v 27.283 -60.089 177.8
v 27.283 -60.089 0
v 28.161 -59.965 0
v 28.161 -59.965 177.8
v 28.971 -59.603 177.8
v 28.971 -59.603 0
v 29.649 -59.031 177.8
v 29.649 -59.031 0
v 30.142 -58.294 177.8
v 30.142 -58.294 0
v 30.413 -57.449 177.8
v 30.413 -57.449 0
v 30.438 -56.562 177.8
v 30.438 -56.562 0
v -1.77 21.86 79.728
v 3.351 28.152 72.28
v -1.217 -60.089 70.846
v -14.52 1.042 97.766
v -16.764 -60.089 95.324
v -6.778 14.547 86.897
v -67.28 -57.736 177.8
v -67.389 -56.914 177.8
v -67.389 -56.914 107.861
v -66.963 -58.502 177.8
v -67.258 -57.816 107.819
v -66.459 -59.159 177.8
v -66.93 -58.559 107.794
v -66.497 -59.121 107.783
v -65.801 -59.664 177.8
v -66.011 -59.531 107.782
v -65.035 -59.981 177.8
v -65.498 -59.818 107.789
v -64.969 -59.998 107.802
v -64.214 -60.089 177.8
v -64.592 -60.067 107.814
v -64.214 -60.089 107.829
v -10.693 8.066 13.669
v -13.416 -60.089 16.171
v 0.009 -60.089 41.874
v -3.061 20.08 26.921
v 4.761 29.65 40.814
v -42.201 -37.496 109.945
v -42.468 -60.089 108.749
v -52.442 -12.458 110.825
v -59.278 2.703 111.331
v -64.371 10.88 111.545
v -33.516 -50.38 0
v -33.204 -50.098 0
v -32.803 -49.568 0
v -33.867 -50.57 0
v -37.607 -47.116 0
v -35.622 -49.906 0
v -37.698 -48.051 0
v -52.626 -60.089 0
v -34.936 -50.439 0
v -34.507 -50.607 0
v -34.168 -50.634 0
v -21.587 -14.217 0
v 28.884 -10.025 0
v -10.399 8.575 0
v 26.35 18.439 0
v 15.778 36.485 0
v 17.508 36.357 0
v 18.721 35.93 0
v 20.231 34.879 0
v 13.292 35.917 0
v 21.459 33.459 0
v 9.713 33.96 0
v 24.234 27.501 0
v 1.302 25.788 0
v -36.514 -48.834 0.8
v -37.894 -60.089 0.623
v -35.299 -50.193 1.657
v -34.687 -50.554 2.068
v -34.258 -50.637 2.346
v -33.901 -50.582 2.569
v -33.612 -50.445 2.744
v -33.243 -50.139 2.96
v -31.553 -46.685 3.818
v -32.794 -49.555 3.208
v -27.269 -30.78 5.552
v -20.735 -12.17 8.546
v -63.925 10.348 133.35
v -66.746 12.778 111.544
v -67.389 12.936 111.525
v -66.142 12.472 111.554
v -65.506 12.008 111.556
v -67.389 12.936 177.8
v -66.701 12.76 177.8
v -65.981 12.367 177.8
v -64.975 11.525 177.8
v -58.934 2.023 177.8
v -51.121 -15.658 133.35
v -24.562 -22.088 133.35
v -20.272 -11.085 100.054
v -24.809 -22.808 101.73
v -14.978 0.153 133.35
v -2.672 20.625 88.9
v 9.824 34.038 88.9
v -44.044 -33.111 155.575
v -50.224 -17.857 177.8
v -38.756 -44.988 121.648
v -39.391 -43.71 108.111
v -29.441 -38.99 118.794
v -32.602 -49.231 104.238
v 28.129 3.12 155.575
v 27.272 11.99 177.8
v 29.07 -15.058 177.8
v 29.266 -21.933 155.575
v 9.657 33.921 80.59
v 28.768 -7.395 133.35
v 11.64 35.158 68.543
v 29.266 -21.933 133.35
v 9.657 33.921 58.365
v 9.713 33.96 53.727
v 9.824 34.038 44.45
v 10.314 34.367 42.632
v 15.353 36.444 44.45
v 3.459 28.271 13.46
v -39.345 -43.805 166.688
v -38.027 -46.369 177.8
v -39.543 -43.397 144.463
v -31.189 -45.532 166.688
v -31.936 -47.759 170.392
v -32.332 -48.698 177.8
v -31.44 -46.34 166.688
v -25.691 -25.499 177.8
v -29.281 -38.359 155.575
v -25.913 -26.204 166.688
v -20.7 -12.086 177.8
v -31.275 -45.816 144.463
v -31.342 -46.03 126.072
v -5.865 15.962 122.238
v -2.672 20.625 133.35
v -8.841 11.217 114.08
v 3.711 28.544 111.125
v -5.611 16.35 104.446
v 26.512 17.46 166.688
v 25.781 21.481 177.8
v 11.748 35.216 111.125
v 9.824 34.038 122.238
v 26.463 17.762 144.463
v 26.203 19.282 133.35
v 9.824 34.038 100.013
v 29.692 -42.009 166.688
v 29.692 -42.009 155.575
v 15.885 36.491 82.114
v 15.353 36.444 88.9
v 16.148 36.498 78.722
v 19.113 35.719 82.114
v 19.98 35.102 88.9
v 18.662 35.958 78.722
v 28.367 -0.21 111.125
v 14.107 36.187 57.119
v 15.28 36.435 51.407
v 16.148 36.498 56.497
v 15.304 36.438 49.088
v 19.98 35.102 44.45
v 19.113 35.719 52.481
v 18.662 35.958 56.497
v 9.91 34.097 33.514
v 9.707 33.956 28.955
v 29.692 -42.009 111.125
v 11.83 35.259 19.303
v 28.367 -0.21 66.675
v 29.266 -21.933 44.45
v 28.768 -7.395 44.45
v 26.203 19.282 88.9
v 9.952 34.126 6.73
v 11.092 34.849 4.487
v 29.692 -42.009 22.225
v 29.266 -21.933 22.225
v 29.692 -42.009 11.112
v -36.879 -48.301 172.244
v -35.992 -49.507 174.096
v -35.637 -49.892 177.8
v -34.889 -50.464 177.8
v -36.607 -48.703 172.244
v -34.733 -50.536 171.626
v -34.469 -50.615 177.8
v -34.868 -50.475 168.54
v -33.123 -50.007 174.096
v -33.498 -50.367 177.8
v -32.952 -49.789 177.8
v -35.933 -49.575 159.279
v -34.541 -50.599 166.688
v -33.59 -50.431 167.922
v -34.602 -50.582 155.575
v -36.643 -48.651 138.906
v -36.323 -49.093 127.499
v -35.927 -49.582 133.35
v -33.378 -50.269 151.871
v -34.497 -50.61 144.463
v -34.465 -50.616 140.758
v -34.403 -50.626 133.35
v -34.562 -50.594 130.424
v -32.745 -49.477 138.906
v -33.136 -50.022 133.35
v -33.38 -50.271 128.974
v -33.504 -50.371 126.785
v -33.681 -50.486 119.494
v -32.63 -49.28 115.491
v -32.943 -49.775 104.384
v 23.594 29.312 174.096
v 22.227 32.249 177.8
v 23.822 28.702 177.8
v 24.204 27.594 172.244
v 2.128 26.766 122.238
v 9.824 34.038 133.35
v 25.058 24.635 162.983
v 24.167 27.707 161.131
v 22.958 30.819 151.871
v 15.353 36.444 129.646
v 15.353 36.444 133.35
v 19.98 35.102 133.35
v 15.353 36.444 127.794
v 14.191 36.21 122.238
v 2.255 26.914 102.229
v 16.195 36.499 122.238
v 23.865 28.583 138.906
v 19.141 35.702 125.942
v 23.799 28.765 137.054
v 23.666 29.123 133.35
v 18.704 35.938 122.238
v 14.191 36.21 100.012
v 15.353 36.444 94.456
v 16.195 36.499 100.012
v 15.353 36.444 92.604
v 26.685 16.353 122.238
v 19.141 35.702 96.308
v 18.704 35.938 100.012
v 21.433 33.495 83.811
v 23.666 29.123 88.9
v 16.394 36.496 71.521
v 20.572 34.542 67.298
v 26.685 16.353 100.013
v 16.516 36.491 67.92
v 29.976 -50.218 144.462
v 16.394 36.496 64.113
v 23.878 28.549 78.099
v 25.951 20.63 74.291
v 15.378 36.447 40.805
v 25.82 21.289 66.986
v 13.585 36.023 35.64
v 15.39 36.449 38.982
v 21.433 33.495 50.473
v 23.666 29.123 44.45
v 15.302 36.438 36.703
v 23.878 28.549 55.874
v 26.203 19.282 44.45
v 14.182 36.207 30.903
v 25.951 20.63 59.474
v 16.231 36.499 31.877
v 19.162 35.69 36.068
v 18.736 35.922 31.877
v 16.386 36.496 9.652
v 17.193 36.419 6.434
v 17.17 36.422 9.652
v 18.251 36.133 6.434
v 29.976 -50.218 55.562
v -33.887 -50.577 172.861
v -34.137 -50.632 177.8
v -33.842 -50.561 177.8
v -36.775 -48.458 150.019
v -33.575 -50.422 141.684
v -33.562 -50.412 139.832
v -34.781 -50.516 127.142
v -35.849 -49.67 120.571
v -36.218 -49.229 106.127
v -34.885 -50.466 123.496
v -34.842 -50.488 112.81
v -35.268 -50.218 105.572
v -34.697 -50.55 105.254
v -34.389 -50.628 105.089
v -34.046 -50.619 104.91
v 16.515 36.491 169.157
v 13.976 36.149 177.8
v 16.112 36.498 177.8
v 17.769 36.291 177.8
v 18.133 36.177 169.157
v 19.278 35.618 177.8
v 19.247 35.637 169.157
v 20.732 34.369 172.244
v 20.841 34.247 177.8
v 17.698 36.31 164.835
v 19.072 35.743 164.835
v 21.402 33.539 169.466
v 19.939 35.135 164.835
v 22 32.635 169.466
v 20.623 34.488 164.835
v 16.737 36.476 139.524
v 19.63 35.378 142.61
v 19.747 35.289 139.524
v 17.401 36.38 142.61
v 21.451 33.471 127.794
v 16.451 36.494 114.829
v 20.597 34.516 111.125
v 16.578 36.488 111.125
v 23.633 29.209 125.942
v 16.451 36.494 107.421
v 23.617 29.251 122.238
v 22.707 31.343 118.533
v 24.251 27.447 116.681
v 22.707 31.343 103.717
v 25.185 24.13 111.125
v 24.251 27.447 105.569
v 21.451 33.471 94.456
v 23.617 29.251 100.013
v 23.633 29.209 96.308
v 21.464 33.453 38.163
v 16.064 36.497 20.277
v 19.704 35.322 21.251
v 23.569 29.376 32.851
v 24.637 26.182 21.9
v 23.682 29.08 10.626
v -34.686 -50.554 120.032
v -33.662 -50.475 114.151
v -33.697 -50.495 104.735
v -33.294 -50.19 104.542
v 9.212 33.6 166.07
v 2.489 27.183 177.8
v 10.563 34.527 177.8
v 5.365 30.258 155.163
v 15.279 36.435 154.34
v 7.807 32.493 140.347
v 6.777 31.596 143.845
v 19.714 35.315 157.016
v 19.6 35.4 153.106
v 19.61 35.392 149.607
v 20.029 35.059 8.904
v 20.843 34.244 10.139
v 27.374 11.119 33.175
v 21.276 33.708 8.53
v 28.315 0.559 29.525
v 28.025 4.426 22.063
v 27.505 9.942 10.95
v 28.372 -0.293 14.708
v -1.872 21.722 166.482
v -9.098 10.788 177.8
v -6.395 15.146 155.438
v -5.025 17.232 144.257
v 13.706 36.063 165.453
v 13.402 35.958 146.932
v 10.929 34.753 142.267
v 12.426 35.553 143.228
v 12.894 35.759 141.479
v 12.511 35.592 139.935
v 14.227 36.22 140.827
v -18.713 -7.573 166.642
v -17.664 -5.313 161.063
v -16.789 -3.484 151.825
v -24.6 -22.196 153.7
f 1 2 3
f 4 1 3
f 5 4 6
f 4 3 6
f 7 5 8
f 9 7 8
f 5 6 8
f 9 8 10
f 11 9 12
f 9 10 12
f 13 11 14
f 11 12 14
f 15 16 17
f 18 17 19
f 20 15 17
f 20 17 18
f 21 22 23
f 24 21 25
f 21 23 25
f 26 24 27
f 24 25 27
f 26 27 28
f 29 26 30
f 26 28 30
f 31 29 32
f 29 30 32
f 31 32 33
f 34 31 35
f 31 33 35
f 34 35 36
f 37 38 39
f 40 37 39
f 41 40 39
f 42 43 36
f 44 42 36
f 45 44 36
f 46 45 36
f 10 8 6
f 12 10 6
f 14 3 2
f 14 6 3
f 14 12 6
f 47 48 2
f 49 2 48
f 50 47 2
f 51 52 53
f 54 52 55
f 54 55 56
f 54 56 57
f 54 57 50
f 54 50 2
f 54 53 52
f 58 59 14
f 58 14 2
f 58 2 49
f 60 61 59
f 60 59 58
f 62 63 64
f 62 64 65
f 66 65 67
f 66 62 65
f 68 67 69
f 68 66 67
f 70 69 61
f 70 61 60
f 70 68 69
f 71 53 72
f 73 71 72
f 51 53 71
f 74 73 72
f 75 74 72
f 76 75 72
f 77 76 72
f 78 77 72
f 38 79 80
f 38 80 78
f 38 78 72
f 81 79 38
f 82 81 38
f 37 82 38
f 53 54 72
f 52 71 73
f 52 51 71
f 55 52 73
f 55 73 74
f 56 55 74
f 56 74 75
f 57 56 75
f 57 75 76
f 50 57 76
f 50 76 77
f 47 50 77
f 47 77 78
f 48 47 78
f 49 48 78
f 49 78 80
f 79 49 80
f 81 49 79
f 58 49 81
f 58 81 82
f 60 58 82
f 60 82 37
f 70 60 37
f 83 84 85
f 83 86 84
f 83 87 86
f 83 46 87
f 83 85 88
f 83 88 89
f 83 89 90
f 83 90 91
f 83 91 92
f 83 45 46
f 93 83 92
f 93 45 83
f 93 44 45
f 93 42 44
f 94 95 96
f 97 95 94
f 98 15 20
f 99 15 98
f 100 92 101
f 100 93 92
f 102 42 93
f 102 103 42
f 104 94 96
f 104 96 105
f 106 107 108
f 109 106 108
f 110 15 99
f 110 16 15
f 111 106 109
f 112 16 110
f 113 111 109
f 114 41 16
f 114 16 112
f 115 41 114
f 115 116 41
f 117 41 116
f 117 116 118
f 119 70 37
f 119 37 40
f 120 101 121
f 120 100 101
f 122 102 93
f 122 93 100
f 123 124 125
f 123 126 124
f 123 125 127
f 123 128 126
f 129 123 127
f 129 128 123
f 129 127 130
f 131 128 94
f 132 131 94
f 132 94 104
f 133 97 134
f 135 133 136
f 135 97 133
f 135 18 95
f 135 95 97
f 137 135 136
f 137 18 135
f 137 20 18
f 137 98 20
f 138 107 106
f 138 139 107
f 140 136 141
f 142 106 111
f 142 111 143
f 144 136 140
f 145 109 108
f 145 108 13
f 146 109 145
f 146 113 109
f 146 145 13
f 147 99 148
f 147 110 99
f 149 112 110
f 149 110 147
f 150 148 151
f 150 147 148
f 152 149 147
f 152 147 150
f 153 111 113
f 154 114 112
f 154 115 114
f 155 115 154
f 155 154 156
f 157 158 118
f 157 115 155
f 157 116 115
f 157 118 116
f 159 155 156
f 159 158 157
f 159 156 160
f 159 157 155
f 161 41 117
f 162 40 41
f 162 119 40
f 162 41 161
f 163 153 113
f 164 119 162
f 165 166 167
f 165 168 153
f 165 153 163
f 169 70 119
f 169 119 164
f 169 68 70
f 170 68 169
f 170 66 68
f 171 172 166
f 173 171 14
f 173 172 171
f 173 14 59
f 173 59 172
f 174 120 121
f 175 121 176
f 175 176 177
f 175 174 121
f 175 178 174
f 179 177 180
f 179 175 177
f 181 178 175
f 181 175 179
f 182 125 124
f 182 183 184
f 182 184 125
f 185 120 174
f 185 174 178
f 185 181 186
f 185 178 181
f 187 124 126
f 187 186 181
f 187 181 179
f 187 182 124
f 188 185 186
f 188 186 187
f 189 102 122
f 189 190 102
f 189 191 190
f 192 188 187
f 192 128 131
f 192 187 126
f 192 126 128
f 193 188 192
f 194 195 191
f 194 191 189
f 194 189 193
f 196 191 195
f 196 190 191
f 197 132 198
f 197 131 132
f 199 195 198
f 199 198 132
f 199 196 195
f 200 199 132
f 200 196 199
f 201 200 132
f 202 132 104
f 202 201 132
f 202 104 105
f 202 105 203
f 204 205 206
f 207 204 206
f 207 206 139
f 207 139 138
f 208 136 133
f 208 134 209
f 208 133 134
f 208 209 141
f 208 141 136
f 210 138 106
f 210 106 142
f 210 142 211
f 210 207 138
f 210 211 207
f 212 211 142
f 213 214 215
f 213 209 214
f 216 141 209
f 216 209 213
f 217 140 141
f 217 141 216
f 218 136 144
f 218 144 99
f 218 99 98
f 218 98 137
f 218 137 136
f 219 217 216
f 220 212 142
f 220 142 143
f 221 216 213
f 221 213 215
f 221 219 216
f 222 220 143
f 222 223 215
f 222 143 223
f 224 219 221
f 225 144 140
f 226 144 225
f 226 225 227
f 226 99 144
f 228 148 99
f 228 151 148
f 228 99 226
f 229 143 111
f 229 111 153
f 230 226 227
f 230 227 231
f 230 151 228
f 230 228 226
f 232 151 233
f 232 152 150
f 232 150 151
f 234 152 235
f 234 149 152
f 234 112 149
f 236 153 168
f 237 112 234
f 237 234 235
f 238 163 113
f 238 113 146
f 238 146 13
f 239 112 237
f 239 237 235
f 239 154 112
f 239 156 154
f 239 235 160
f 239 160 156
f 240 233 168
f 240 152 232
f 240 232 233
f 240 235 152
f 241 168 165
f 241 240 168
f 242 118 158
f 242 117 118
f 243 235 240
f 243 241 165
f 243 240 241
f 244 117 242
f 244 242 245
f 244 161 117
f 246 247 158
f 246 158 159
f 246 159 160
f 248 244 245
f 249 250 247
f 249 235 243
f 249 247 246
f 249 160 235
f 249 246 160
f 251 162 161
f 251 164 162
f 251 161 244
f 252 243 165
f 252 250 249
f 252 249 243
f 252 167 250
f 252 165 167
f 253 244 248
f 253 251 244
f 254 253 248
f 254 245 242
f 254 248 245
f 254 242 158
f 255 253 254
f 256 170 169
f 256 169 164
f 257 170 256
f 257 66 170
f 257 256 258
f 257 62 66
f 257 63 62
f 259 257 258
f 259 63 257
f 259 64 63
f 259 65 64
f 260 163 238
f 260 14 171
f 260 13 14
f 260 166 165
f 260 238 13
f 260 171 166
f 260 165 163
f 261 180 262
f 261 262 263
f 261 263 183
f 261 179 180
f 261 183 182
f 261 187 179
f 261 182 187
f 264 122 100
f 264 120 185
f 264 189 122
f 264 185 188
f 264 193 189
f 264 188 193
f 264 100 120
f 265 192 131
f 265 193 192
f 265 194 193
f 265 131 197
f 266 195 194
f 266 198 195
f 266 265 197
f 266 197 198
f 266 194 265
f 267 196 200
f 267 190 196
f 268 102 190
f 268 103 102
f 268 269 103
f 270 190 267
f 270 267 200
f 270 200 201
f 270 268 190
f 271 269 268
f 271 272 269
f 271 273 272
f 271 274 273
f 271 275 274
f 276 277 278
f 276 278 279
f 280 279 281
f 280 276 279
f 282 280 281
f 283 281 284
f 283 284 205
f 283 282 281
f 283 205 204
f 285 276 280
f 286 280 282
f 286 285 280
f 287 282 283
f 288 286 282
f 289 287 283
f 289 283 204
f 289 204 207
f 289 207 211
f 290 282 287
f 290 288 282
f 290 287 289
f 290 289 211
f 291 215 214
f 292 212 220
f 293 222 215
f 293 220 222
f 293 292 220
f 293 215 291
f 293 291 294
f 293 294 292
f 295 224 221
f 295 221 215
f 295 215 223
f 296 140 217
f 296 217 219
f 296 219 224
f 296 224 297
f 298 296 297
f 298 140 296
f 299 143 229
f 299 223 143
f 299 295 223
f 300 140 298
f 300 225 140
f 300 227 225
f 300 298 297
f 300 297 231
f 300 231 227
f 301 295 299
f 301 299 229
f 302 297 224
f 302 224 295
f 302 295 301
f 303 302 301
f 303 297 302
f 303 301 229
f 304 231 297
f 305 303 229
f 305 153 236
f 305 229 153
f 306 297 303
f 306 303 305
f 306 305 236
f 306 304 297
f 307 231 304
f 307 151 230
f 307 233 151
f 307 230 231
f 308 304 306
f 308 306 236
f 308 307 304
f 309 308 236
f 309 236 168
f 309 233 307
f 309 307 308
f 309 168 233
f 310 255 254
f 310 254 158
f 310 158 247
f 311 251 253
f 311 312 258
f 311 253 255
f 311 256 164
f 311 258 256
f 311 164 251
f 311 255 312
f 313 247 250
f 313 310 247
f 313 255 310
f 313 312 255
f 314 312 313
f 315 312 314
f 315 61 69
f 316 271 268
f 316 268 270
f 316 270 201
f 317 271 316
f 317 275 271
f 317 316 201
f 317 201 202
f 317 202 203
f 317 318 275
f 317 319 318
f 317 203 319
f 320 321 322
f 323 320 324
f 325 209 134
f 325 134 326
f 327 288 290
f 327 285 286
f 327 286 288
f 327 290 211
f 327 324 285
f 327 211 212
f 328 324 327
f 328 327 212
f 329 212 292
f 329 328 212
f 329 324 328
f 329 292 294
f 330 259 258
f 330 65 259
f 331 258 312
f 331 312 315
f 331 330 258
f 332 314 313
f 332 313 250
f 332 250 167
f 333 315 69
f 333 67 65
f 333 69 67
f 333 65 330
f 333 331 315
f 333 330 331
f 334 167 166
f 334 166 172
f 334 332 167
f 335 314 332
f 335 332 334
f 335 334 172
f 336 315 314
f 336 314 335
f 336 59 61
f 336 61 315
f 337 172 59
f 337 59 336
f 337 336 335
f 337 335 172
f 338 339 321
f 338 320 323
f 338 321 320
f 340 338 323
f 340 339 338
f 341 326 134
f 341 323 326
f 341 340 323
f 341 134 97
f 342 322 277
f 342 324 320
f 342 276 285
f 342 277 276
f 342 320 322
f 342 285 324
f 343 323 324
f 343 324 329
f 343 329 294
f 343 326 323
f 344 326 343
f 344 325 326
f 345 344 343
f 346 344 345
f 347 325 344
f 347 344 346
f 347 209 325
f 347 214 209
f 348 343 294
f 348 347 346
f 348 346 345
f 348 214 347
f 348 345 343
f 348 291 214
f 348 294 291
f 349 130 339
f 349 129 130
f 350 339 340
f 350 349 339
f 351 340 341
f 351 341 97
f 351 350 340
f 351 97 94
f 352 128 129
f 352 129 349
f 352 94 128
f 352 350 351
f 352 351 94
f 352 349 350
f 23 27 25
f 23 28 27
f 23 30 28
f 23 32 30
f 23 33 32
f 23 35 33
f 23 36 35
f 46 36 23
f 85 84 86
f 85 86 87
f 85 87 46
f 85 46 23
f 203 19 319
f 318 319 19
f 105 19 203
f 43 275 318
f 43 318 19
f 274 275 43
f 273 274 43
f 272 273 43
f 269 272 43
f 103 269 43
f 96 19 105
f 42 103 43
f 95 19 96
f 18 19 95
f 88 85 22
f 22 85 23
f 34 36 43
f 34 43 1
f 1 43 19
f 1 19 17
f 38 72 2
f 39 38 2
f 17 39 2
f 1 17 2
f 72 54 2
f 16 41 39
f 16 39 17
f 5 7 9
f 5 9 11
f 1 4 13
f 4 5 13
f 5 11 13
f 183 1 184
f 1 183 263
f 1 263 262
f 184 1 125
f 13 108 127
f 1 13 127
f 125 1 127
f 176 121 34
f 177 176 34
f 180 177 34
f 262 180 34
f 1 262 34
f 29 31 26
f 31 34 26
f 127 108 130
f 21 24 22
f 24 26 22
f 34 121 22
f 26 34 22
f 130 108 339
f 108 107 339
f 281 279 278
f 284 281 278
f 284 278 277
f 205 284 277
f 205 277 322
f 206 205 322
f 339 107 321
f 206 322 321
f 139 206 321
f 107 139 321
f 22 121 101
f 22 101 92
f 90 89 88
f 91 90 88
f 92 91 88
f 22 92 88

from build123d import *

# Parameters (mm, degrees)
F1_DEPTH = 177.8
F3_DEPTH = 254
F3_TAPER = -3


with BuildPart() as f1:
    # F0 (on Top) → F1 (new body)
    with BuildSketch(Plane.XY):
        with BuildLine():
            add(Edge.make_bspline(
                [(-67.3885593742, 12.9356722599), (-59.0465416425, 12.1528384674), (-32.2707868024, -76.8000150755), (-30.0001551072, -17.8692297072), (34.5471698729, 84.6417041824), (28.3569236155, -37.8965707865), (30.4384071088, -56.5624558944)],
                knots=[0, 0, 0, 0, 0.2604277323, 0.4302227628, 0.6952612142, 0.9778012896, 0.9778012896, 0.9778012896, 0.9778012896], degree=3))
            Line((-67.3885593742, 12.9356722599), (-67.3885593742, -56.9143277401))
            ThreePointArc((-67.3885593742, -56.9143277401), (-66.4586234045, -59.1593917704), (-64.2135593742, -60.0893277401))
            Line((-64.2135593742, -60.0893277401), (27.282965586, -60.0893277401))
            ThreePointArc((27.282965586, -60.0893277401), (29.6491669838, -59.031334104), (30.4384071088, -56.5624558944))
        make_face()
    extrude(amount=F1_DEPTH)

    # F2 (on face) → F3 (cut)
    with BuildSketch(Plane.XZ.offset(60.0893277401)):
        Polygon((-64.2135593742, 0), (-64.2135593742, 107.8289228659), (-71.4398649842, 107.5232396894), (-95.917720614, 91.9757827925), (-109.3424369711, 66.2723623407), (-108.1168721491, 37.3001890867), (-92.5694152522, 12.8223334569), (-66.8659948004, -0.6023829002), (-52.6257510897, 0), align=None)
        Polygon((-16.7642712784, 95.3240881544), (-42.4676917302, 108.7488045115), (-64.2135593742, 107.8289228659), (-64.2135593742, 0), (-52.6257510897, 0), (-37.8938215464, 0.6231819219), (-13.4159659166, 16.1706388188), (0.0087504405, 41.8740592706), (-1.2168143815, 70.8462325246), align=None)
    extrude(amount=-F3_DEPTH, taper=F3_TAPER, mode=Mode.SUBTRACT)


solid = f1.part
